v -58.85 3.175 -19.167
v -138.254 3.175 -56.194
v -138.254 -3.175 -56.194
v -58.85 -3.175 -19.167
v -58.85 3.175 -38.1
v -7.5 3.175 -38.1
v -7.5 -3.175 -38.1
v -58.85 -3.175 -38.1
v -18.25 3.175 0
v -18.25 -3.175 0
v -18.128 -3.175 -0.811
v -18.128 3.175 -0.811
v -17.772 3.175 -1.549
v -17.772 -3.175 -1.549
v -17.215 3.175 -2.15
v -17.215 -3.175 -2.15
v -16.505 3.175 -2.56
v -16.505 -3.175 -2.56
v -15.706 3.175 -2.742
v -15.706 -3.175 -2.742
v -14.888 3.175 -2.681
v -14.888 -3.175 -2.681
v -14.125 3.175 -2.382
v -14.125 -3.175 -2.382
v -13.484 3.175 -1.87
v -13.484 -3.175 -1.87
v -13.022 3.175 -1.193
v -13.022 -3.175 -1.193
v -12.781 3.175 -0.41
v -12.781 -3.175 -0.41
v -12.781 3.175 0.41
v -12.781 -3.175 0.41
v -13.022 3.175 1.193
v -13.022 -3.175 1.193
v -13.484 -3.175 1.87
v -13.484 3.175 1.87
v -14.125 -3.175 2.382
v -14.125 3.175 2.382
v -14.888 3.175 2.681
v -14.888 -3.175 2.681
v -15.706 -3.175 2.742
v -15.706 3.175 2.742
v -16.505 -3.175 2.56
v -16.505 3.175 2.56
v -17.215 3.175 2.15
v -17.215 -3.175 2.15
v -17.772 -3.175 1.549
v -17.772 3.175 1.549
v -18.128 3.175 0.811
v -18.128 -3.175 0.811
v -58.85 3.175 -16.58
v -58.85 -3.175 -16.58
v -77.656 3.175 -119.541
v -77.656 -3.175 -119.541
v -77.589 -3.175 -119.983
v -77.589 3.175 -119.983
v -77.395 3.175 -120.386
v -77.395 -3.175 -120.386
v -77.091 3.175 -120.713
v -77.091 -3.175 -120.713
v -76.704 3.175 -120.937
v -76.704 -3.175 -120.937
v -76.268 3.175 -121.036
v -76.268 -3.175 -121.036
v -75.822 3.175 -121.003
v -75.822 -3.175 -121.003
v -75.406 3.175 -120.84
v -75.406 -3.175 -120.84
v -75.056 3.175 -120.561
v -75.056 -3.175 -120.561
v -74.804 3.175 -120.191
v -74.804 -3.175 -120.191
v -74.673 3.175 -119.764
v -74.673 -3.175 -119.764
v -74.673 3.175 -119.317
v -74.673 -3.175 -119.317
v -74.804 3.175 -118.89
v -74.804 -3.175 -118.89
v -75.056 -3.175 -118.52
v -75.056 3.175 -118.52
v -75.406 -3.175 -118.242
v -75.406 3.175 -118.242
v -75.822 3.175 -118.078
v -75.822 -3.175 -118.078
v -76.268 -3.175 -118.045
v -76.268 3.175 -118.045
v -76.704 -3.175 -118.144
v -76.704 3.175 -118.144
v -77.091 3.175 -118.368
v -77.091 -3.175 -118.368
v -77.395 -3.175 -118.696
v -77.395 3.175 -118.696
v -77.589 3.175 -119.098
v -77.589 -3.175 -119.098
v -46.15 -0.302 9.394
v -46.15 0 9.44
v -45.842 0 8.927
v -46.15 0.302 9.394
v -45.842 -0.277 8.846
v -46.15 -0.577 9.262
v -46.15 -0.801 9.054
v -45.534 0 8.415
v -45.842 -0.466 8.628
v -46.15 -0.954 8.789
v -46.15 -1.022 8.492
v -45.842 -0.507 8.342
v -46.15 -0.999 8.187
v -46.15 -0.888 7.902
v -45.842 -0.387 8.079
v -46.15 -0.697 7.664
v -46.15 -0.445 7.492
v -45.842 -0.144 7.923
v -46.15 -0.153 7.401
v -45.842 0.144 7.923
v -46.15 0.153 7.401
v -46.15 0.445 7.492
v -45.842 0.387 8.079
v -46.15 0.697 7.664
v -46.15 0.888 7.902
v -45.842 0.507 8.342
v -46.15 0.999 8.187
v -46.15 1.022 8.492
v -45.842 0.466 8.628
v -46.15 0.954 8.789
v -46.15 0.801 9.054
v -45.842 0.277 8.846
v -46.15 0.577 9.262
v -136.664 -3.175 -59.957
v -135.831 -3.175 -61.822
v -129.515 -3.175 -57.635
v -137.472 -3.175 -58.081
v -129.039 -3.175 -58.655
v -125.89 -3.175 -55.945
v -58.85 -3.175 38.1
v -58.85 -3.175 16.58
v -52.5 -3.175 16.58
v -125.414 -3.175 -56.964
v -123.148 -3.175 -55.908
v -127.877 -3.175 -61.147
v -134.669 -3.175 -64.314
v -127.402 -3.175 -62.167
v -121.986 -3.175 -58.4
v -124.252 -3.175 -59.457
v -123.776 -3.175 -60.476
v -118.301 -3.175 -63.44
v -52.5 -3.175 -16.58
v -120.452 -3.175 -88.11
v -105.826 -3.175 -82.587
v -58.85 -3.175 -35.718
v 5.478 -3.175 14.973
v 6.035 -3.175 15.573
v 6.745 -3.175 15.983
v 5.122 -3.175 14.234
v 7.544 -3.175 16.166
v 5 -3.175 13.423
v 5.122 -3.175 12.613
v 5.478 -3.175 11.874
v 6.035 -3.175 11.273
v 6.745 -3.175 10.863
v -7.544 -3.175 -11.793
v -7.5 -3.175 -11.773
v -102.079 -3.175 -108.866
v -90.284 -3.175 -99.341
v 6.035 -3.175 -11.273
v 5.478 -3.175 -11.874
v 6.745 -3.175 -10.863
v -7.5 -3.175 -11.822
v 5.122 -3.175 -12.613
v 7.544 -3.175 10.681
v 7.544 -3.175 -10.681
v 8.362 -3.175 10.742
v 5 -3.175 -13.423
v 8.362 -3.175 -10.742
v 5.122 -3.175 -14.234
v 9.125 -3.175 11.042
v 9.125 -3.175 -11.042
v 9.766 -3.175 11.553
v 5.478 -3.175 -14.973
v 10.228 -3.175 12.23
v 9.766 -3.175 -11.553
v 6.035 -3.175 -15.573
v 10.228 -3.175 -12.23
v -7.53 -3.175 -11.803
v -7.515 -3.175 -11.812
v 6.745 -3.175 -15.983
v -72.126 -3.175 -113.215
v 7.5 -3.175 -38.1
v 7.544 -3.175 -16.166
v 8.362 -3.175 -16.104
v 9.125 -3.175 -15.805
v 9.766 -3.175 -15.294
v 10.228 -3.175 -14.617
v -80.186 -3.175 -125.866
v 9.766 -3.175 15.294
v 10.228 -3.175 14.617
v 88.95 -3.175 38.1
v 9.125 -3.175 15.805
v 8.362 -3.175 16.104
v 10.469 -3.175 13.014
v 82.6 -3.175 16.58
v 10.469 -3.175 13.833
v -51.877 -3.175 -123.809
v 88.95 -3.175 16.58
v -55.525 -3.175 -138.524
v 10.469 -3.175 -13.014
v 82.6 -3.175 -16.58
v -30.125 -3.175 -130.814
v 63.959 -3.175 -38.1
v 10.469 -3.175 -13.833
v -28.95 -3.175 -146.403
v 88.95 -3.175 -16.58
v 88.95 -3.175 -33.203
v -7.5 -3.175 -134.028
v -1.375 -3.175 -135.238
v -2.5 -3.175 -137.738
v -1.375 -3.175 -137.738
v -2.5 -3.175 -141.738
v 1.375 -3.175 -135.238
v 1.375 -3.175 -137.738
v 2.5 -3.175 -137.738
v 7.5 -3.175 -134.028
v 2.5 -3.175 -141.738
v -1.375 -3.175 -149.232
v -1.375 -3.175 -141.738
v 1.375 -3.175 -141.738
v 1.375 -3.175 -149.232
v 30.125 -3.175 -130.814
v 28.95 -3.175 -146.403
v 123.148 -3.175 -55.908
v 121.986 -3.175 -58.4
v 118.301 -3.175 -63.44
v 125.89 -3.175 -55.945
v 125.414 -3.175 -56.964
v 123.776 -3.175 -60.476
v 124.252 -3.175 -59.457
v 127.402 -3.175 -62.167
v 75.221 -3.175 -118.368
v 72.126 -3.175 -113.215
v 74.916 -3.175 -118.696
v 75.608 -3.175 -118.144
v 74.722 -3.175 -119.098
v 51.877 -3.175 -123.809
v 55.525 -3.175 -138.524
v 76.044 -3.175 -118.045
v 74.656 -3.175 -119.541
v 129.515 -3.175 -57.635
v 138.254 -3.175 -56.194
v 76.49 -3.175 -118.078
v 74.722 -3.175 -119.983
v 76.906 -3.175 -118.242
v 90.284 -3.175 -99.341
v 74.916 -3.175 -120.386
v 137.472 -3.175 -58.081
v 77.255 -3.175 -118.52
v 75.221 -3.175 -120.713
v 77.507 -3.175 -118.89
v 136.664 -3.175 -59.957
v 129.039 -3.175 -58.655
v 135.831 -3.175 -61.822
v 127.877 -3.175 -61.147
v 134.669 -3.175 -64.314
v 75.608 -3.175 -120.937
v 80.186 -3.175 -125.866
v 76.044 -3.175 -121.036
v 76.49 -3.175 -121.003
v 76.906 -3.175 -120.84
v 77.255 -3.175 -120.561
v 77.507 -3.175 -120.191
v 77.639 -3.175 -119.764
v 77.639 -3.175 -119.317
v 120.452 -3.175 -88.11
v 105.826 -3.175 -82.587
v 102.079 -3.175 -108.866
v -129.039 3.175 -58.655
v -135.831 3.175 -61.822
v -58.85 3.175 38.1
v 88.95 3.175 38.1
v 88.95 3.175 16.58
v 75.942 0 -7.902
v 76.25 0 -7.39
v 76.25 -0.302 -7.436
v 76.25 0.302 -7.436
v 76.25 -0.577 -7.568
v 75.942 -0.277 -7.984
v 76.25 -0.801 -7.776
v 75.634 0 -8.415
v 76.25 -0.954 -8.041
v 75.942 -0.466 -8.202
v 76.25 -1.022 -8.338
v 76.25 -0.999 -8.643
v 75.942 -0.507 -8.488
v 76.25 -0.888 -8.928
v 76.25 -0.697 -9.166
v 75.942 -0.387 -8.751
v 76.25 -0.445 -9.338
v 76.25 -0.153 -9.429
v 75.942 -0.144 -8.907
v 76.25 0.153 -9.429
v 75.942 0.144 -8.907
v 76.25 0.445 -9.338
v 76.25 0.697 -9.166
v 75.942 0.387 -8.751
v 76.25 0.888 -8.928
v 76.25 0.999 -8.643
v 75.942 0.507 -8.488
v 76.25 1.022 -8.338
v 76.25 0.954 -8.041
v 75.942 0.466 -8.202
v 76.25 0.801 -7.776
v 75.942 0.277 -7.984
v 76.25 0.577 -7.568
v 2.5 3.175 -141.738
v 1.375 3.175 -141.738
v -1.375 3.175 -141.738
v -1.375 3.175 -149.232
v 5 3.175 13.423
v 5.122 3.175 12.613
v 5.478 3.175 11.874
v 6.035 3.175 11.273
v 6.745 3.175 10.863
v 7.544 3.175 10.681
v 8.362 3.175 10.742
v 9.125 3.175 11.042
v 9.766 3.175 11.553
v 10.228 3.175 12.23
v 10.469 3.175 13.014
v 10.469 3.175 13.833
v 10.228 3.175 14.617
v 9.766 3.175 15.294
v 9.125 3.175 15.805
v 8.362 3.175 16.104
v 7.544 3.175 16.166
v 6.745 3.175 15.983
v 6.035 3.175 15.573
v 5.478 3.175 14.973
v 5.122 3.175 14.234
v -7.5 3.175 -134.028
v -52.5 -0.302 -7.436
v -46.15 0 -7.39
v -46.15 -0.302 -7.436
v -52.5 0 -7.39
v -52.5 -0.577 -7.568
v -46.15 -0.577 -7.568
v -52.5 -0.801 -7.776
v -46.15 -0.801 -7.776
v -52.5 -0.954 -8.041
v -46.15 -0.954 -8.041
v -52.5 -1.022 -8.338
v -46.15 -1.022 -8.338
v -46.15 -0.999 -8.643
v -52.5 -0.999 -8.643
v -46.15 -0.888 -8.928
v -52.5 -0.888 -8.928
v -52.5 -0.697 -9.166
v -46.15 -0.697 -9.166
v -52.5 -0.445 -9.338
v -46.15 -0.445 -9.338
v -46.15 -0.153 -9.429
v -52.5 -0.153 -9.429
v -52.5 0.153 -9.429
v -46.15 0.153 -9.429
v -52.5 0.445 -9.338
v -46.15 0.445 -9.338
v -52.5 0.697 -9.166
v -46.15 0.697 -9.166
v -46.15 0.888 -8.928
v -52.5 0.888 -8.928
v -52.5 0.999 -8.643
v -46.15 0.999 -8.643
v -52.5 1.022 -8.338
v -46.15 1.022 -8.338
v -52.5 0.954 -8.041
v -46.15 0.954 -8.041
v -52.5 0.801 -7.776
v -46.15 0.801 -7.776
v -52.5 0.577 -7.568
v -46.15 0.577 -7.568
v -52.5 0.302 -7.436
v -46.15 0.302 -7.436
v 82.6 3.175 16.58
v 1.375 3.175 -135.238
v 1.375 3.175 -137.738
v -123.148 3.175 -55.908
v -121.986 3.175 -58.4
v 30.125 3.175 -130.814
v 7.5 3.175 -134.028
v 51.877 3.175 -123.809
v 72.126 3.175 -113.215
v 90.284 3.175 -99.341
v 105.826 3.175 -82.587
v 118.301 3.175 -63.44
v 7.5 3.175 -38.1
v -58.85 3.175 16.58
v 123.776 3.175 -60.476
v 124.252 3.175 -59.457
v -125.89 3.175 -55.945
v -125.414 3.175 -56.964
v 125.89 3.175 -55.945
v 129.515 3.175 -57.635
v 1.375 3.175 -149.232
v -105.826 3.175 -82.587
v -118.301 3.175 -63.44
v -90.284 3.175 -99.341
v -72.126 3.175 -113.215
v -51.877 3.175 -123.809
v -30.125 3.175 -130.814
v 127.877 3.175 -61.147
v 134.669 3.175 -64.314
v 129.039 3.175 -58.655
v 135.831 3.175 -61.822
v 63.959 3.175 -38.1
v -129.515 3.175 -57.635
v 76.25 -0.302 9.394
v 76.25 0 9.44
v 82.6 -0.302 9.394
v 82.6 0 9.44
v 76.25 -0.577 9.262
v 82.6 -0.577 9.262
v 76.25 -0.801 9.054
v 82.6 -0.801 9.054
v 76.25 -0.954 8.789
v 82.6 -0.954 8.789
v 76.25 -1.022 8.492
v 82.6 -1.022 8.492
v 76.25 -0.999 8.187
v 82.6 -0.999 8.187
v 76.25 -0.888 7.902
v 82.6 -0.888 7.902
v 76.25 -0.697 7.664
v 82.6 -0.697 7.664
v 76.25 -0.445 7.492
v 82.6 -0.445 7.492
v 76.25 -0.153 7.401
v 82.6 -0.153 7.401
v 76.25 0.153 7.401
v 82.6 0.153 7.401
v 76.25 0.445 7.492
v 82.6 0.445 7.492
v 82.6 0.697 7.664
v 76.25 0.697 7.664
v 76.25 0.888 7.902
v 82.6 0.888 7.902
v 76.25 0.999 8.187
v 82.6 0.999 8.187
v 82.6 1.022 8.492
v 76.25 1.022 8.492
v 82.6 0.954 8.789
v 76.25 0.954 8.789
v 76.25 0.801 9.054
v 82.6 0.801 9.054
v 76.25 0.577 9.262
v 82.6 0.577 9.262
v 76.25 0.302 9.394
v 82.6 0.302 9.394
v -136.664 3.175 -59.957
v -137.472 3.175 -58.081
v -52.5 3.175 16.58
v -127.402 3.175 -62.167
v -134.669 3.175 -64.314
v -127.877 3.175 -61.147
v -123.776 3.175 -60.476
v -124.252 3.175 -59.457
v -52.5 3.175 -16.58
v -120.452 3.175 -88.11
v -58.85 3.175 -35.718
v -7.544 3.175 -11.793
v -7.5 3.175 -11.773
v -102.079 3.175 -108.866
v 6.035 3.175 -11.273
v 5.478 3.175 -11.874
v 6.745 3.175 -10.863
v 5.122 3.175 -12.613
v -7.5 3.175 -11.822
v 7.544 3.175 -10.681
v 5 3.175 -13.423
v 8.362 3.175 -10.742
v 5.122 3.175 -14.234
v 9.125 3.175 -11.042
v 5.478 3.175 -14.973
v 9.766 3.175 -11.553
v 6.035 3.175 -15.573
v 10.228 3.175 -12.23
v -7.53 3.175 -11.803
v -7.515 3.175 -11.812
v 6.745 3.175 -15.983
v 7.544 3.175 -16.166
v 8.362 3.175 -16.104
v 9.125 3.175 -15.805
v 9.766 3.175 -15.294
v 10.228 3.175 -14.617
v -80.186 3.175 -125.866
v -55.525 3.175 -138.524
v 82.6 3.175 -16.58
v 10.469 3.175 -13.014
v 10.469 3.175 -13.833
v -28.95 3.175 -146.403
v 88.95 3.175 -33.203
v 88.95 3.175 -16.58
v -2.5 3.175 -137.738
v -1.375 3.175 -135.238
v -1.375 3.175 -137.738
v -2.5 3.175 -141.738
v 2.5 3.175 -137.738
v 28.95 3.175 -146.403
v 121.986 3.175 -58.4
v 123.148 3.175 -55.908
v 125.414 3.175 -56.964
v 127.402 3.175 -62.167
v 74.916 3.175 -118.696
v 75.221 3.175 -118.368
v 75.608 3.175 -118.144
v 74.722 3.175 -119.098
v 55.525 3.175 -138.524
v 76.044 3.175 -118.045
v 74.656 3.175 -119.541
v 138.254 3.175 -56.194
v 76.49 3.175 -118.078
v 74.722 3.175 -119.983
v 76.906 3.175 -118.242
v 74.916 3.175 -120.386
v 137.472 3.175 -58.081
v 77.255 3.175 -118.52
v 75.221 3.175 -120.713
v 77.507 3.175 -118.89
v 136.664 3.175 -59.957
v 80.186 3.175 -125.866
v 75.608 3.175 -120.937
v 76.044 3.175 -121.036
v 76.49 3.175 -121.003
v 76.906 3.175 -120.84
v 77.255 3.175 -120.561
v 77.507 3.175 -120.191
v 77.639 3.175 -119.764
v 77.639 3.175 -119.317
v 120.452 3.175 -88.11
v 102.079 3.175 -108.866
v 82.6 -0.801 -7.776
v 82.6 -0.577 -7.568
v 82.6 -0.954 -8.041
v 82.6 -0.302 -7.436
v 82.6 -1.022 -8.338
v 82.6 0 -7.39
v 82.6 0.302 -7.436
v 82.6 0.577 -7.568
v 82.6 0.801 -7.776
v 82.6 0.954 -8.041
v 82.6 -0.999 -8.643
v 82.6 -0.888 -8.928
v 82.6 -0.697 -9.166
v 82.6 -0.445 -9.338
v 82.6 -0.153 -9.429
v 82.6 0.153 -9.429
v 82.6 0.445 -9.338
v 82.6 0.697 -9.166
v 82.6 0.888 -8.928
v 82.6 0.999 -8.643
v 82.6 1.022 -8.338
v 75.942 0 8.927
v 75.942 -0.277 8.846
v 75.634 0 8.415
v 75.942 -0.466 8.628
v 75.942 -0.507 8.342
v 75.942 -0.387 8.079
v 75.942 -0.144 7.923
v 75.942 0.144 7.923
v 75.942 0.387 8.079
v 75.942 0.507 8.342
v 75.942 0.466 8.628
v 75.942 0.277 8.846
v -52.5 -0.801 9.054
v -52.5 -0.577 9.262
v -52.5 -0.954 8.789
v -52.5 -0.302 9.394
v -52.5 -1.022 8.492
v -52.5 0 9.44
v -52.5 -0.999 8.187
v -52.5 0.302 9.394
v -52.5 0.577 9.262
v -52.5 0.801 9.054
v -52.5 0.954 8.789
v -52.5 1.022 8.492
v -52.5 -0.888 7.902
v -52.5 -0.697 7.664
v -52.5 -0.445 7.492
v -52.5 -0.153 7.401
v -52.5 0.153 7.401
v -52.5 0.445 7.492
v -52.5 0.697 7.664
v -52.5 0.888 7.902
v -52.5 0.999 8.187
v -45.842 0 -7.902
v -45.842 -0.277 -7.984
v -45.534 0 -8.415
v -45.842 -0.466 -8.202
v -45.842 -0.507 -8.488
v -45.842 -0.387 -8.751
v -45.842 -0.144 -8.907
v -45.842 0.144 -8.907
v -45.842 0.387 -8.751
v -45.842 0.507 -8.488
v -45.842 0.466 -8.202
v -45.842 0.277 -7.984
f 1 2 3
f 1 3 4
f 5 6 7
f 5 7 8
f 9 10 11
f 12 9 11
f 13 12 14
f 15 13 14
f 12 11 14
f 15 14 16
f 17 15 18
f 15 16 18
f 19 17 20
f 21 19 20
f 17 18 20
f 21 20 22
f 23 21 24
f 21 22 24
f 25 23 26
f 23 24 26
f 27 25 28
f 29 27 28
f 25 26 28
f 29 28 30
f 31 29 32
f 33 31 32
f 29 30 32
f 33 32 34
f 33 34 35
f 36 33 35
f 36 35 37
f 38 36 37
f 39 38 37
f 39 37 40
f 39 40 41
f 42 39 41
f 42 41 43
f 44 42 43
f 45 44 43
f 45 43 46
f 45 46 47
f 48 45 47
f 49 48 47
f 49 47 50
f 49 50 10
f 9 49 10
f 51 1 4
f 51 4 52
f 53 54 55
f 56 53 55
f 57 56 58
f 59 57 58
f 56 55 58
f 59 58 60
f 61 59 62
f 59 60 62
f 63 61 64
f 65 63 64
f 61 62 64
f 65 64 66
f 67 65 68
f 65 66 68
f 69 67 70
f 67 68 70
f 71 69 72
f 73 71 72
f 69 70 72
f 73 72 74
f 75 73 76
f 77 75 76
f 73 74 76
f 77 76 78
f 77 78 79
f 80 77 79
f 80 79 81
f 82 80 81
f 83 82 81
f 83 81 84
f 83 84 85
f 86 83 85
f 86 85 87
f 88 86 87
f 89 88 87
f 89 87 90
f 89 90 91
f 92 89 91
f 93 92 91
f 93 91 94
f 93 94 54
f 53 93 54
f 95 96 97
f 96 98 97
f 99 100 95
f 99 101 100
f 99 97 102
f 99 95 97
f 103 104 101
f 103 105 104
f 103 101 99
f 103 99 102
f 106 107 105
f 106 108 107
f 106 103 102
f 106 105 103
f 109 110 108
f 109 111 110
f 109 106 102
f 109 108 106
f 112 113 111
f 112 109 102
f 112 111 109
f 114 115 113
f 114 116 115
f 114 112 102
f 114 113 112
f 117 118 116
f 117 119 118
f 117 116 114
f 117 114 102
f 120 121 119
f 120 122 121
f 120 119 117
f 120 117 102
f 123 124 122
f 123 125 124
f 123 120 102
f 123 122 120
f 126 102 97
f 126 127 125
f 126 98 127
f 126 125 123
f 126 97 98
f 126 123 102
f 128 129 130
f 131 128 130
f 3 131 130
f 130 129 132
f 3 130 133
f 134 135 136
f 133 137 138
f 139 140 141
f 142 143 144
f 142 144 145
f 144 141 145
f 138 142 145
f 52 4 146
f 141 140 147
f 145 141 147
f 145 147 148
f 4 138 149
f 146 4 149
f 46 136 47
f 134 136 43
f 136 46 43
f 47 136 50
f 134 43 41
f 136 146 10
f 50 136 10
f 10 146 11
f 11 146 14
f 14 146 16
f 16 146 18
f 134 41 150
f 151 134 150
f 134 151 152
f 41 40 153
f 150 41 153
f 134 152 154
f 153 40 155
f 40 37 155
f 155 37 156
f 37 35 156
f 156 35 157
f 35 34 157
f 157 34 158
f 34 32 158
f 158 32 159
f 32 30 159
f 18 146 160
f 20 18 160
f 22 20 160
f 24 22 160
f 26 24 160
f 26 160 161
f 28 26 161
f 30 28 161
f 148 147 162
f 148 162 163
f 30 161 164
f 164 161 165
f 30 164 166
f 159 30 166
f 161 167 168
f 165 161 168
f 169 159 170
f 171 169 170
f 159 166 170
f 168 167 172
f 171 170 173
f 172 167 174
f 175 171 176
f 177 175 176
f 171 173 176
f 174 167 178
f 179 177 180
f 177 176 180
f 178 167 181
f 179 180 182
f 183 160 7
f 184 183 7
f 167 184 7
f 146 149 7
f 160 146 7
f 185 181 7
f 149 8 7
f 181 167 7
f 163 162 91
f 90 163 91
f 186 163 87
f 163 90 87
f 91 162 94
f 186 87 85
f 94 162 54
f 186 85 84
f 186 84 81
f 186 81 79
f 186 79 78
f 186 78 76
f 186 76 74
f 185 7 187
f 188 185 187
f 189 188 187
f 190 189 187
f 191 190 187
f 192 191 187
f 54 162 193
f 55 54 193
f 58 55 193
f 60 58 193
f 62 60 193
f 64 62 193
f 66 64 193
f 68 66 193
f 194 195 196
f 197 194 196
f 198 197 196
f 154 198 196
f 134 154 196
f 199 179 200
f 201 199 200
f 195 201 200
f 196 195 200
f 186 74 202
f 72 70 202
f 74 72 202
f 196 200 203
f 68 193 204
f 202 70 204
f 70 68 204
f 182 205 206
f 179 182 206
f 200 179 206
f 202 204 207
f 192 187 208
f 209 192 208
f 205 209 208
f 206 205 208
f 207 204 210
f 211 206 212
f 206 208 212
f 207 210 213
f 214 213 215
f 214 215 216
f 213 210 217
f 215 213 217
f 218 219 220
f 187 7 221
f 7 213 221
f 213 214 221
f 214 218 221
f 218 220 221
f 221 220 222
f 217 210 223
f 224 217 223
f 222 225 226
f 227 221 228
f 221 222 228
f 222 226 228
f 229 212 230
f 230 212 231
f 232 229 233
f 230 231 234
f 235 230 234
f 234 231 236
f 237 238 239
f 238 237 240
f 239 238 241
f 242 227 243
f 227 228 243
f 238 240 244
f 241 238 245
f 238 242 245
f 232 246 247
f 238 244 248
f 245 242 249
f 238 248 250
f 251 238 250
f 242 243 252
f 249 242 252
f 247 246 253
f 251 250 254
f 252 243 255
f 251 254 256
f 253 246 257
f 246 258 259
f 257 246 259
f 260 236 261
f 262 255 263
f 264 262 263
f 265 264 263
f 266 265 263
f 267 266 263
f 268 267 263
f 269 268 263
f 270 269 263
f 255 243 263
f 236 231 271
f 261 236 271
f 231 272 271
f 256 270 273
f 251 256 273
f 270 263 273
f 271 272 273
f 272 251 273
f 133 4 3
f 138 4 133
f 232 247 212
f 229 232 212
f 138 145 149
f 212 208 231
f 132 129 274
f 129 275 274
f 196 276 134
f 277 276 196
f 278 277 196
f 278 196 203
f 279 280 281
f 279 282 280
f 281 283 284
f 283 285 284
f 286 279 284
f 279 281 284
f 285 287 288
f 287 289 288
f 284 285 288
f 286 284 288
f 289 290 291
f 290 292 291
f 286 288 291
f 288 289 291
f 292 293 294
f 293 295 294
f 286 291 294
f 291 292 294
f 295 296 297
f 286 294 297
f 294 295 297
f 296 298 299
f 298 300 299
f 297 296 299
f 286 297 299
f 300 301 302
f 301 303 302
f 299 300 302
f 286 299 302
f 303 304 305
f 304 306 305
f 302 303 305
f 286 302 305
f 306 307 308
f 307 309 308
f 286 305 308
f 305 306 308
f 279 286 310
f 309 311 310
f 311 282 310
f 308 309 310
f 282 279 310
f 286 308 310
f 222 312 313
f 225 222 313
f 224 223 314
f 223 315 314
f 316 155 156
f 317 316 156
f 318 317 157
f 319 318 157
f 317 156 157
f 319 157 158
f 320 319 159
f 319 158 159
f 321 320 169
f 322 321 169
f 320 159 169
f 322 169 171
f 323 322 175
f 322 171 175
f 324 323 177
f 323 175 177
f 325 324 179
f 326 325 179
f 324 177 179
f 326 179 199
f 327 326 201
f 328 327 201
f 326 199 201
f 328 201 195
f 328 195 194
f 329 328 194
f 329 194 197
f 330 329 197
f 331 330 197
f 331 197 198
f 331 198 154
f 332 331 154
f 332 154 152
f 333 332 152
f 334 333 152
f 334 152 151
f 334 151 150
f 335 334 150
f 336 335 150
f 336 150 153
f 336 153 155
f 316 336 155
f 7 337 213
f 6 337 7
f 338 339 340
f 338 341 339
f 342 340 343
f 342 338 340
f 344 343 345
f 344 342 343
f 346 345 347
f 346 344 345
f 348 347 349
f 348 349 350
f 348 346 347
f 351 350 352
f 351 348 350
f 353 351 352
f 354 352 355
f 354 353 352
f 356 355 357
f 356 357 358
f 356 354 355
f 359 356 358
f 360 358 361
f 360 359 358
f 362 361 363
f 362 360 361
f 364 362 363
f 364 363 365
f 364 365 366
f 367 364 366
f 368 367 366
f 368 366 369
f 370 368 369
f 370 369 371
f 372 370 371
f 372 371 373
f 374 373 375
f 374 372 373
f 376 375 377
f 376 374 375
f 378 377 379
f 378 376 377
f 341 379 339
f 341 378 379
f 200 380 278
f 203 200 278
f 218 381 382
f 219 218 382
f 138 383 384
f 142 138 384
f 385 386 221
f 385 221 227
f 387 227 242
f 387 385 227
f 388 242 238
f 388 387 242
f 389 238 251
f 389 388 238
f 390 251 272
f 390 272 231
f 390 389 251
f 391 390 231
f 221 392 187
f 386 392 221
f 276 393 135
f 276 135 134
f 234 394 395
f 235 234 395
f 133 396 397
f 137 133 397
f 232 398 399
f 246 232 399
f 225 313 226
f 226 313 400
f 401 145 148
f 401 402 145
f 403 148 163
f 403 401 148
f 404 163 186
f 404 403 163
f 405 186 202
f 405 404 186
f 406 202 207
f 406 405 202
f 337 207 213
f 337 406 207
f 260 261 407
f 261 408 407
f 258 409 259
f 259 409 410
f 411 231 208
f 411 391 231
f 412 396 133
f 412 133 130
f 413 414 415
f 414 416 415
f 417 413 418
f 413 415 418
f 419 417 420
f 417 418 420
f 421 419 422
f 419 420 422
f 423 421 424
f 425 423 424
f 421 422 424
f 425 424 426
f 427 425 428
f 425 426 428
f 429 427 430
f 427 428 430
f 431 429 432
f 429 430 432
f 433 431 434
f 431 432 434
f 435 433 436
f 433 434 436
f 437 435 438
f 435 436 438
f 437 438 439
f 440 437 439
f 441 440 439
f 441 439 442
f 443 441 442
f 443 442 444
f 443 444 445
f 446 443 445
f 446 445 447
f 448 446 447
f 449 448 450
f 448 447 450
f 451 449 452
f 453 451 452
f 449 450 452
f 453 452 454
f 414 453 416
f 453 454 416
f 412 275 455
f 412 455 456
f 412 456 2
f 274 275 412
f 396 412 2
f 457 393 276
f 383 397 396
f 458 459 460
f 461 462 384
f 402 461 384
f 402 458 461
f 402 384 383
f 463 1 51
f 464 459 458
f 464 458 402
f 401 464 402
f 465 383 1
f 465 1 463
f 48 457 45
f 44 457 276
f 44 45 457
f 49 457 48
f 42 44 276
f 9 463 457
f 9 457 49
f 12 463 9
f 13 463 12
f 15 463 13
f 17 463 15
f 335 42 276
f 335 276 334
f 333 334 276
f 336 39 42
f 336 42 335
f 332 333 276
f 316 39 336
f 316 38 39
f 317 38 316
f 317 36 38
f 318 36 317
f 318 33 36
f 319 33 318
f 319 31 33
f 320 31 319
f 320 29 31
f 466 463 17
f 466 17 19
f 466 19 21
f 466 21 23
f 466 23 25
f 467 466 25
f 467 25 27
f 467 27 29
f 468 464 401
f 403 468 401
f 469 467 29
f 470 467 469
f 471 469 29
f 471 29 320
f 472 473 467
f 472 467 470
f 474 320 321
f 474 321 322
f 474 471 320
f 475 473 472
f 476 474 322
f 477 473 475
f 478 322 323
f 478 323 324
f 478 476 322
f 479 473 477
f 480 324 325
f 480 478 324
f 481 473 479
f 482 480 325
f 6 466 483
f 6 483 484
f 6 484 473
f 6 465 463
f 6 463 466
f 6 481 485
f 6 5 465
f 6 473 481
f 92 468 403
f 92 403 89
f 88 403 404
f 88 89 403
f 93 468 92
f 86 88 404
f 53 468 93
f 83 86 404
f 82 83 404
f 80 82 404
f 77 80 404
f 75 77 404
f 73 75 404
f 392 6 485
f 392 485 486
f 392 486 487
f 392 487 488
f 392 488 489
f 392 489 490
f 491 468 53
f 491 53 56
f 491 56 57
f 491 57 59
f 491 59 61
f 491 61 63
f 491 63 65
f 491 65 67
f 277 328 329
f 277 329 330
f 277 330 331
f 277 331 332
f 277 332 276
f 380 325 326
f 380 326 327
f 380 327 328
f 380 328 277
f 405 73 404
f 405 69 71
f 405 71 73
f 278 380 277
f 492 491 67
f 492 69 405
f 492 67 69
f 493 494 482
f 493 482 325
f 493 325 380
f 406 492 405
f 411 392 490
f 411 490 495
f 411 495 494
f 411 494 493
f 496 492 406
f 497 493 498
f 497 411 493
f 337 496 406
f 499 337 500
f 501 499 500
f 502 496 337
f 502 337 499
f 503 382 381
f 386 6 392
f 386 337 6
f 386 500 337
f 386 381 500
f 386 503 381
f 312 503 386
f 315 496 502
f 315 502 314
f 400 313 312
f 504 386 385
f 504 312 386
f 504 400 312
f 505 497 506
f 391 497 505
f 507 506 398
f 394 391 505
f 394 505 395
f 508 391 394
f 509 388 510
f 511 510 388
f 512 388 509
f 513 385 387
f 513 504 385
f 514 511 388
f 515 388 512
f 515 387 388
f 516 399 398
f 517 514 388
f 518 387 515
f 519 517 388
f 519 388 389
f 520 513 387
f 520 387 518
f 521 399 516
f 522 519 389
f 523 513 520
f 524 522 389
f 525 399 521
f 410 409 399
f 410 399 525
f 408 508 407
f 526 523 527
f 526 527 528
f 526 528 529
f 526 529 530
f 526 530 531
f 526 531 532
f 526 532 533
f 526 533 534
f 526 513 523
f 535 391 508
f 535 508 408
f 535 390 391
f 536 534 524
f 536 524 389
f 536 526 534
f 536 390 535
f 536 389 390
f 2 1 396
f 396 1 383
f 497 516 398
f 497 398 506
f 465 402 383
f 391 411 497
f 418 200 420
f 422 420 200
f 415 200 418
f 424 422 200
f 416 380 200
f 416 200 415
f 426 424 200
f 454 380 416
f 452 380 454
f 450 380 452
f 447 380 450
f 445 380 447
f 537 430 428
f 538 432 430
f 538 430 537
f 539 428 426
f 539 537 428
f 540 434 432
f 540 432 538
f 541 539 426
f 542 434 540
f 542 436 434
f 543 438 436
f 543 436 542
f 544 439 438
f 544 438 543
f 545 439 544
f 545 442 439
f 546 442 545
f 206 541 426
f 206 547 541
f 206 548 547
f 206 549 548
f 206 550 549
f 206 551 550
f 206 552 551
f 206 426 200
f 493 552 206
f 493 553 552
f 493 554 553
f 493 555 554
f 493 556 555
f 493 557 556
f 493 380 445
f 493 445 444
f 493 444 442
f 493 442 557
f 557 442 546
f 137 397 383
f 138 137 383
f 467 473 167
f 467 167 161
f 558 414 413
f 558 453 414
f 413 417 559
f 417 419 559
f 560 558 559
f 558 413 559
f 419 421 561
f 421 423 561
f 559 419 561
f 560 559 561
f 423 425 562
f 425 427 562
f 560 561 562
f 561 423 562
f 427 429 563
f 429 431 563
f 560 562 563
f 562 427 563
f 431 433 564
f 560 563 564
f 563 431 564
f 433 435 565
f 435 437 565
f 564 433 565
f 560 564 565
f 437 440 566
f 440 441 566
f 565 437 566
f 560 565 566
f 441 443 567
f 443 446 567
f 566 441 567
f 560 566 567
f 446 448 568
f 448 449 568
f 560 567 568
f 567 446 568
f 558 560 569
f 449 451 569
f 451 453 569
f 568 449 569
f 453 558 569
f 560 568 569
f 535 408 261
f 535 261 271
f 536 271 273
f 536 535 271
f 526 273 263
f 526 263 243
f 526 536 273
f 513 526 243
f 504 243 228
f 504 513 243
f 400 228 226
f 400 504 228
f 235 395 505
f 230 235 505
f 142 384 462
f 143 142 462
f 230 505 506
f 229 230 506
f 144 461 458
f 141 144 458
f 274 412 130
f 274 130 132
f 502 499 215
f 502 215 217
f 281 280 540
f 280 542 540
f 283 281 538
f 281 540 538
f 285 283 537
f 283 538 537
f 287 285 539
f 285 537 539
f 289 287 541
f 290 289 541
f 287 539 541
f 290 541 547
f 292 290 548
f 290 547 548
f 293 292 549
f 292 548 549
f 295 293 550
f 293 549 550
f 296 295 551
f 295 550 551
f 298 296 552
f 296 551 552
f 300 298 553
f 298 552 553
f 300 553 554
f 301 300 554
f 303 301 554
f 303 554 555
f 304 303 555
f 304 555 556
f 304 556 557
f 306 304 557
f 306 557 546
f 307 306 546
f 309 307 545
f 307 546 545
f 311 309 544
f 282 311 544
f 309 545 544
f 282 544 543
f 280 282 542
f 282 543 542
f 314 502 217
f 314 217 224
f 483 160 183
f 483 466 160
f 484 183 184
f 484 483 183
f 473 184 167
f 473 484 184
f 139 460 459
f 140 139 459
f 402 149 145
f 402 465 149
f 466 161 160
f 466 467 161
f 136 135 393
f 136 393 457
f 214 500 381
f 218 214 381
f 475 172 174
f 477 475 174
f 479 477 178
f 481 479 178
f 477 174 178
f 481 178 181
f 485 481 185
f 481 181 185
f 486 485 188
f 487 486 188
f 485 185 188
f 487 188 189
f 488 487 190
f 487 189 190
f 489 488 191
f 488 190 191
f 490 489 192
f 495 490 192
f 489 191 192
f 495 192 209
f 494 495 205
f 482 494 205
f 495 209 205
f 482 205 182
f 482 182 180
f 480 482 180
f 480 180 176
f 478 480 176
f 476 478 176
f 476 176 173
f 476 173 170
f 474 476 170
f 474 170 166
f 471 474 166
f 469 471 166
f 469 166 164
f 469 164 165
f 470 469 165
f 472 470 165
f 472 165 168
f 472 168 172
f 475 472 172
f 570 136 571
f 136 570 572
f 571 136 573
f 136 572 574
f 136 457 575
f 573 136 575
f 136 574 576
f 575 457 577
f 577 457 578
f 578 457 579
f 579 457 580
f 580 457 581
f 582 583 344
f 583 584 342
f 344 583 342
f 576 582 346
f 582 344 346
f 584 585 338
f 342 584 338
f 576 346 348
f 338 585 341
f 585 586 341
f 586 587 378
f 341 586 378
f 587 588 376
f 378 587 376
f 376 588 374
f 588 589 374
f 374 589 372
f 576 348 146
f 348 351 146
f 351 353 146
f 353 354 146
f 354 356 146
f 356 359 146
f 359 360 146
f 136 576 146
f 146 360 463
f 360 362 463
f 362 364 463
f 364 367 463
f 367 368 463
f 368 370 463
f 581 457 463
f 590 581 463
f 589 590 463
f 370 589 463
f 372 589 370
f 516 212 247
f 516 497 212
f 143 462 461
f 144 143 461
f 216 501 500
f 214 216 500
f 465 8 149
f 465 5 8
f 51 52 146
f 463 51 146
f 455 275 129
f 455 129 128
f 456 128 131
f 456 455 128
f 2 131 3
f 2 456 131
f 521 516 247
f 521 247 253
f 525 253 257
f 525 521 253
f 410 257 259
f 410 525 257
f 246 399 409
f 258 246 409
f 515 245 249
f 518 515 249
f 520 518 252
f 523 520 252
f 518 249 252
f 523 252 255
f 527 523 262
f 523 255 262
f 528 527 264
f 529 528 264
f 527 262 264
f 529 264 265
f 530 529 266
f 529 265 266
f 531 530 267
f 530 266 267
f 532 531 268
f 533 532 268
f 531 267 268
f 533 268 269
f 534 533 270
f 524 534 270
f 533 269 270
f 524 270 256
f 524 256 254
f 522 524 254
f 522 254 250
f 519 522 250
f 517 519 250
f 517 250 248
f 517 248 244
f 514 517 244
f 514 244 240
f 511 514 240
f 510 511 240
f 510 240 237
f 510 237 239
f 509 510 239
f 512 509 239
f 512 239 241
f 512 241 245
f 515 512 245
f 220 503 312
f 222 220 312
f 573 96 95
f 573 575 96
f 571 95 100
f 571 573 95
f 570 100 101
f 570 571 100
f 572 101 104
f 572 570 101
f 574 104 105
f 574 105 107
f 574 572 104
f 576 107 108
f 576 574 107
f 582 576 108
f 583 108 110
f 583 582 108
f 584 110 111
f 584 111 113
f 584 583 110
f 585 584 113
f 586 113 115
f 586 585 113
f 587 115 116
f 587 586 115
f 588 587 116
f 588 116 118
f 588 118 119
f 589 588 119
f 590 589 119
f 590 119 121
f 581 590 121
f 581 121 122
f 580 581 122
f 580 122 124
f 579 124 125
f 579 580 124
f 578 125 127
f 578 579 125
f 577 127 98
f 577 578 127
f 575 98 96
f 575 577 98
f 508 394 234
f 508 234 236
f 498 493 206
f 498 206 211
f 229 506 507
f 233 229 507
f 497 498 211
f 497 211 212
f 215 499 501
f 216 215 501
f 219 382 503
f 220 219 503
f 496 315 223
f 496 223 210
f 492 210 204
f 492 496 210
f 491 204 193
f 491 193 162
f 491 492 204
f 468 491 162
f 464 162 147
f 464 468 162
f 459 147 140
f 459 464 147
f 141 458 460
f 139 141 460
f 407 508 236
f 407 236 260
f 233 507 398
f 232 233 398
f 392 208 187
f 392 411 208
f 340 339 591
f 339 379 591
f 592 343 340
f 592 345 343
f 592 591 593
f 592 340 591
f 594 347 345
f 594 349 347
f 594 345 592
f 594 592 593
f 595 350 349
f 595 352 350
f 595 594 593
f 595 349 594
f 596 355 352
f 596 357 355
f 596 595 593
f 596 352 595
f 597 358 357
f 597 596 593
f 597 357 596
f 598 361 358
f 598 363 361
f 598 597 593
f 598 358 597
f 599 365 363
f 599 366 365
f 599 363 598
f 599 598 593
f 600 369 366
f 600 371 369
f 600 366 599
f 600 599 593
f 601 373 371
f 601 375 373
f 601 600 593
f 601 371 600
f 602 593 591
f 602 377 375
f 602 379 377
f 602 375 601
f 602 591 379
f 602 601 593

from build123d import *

# Parameters (mm, degrees)
BOSS_EXTRUDE1_DEPTH               = 3.175
SKETCH2_W                         = 2.75
SKETCH2_H                         = 2.5
SKETCH2_H_2                       = 4
SKETCH2_W_2                       = 1.125
SKETCH2_H_3                       = 7.5
CUT_EXTRUDE1_DEPTH                = 204.460831631
CIRPATTERN1_COUNT                 = 2
CIRPATTERN1_ANGLE                 = 65
CIRPATTERN1_THE_OTHER_WAY_COUNT   = 2
CIRPATTERN1_THE_OTHER_WAY_ANGLE   = 65
F_3_0_3_DIAMETER_HOLE1_D          = 3
M5_CLEARANCE_HOLE1_D              = 5.5
SKETCH9_W                         = 6.35
SKETCH9_H                         = 33.16
CUT_EXTRUDE2_DEPTH                = 204.530492207
M2_5X0_45_TAPPED_HOLE1_AT_2_COUNT = 2
M2_5X0_45_TAPPED_HOLE1_AT_2_PITCH = 16.83


with BuildPart() as part:
    # Sketch1 → Boss-Extrude1 (new, symmetric)
    with BuildSketch(Plane(origin=(0, 0, 0), x_dir=(1, 0, 0), z_dir=(0, 1, 0))):
        with BuildLine():
            Line((88.95, 33.202731801), (138.254290129, 56.193699868))
            ThreePointArc((138.254290129, 56.193699868), (0, 149.238), (-138.254290129, 56.193699868))
            Line((-138.254290129, 56.193699868), (-58.85, 19.16687129))
            Line((-58.85, 19.16687129), (-58.85, -38.1))
            Line((-58.85, -38.1), (88.95, -38.1))
            Line((88.95, -38.1), (88.95, 33.202731801))
        make_face()
        with BuildLine():
            Line((-7.5, 11.821590418), (-7.5, 11.772641828))
            Line((-7.5, 11.772641828), (-7.544362488, 11.793328396))
            ThreePointArc((-7.544362488, 11.793328396), (-7.522194517, 11.807480241), (-7.5, 11.821590418))
        make_face(mode=Mode.SUBTRACT)
        with BuildLine():
            ThreePointArc((7.5, 11.821590418), (7.522194517, 11.807480241), (7.544362488, 11.793328396))
            Line((7.544362488, 11.793328396), (7.5, 11.772641828))
            Line((7.5, 11.772641828), (7.5, 11.821590418))
        make_face(mode=Mode.SUBTRACT)
        with BuildLine():
            Line((-7.5, 134.028320306), (-7.5, 38.1))
            Line((-7.5, 38.1), (-58.85, 38.1))
            Line((-58.85, 38.1), (-58.85, 35.717540075))
            Line((-58.85, 35.717540075), (-118.301273414, 63.440124154))
            ThreePointArc((-118.301273414, 63.440124154), (-72.126024825, 113.215180903), (-7.5, 134.028320306))
        make_face(mode=Mode.SUBTRACT)
        with BuildLine():
            ThreePointArc((7.5, 134.028320306), (72.126024825, 113.215180903), (118.301273414, 63.440124154))
            Line((118.301273414, 63.440124154), (63.959201798, 38.1))
            Line((63.959201798, 38.1), (7.5, 38.1))
            Line((7.5, 38.1), (7.5, 134.028320306))
        make_face(mode=Mode.SUBTRACT)
    extrude(amount=BOSS_EXTRUDE1_DEPTH, both=True)

    # Sketch2 → Cut-Extrude1 (cut, symmetric)
    with BuildSketch(Plane(origin=(0, 0, 0), x_dir=(1, 0, 0), z_dir=(0, 1, 0))):
        with Locations((0, 136.488)):
            Rectangle(SKETCH2_W, SKETCH2_H)
        with Locations((0, 139.738)):
            Rectangle(SKETCH2_W, SKETCH2_H_2)
        with Locations((1.9375, 139.738)):
            Rectangle(SKETCH2_W_2, SKETCH2_H_2)
        with Locations((0, 145.488)):
            Rectangle(SKETCH2_W, SKETCH2_H_3)
        with Locations((-1.9375, 139.738)):
            Rectangle(SKETCH2_W_2, SKETCH2_H_2)
    cut_extrude1 = extrude(amount=CUT_EXTRUDE1_DEPTH, both=True, mode=Mode.SUBTRACT)

    # CirPattern1: Cut-Extrude1 ×2 about axis
    cirpattern1_axis = Axis((0, 0, 0), (0, 1, 0))
    for i in range(1, CIRPATTERN1_COUNT):
        add(cut_extrude1.rotate(cirpattern1_axis, i * CIRPATTERN1_ANGLE / (CIRPATTERN1_COUNT - 1)), mode=Mode.SUBTRACT)

    # CirPattern1 the other way: Cut-Extrude1 ×2 about axis
    cirpattern1_the_other_way_axis = Axis((0, 0, 0), (0, -1, 0))
    for i in range(1, CIRPATTERN1_THE_OTHER_WAY_COUNT):
        add(cut_extrude1.rotate(cirpattern1_the_other_way_axis, i * CIRPATTERN1_THE_OTHER_WAY_ANGLE / (CIRPATTERN1_THE_OTHER_WAY_COUNT - 1)), mode=Mode.SUBTRACT)

    # Ø3.0 (3) Diameter Hole1 (through all)
    with Locations(Plane(origin=(0, 3.175, 0), x_dir=(1, 0, 0), z_dir=(0, 1, 0))):
        with Locations((76.155771888, 119.540616747), (-76.155771888, 119.540616747)):
            Hole(F_3_0_3_DIAMETER_HOLE1_D / 2)

    # M5 Clearance Hole1 (through all)
    with Locations(Plane(origin=(0, 3.175, 0), x_dir=(1, 0, 0), z_dir=(0, 1, 0))):
        with Locations((-15.5, 0), (7.75, 13.423393759), (7.75, -13.423393759)):
            Hole(M5_CLEARANCE_HOLE1_D / 2)

    # Sketch9 → Cut-Extrude2 (cut, through all)
    with BuildSketch(Plane(origin=(0, 3.175, 0), x_dir=(1, 0, 0), z_dir=(0, 1, 0))):
        with Locations((-55.675, 0)):
            Rectangle(SKETCH9_W, SKETCH9_H)
        with Locations((85.775, 0)):
            Rectangle(SKETCH9_W, SKETCH9_H)
    extrude(amount=-CUT_EXTRUDE2_DEPTH, mode=Mode.SUBTRACT)

    # Sketch11 → M2.5x0.45 Tapped Hole1 (revolve, cut)
    with BuildSketch(Plane(origin=(-52.5, 0, -8.415), x_dir=(0, 0, 1), z_dir=(0, 1, 0))):
        Polygon((0, 0), (0, 6.965882135), (1.025, 6.35), (1.025, 0), align=None)
    m2_5x0_45_tapped_hole1 = revolve(axis=Axis((-58.85, 0, -8.415), (1, 0, 0)), mode=Mode.SUBTRACT)

    # M2.5x0.45 Tapped Hole1 at 2: M2.5x0.45 Tapped Hole1 ×2
    with Locations(*[(0, 0, i * M2_5X0_45_TAPPED_HOLE1_AT_2_PITCH) for i in range(1, M2_5X0_45_TAPPED_HOLE1_AT_2_COUNT)]):
        add(m2_5x0_45_tapped_hole1, mode=Mode.SUBTRACT)

    # Mirror1: M2.5x0.45 Tapped Hole1 across plane
    add(m2_5x0_45_tapped_hole1.mirror(Plane.ZY.offset(-15.05)), mode=Mode.SUBTRACT)

    # Mirror1 copy 1 sketch → Mirror1 copy 1 (revolve, cut)
    with BuildSketch(Plane(origin=(82.6, 0, 8.415), x_dir=(0, 0, 1), z_dir=(0, 1, 0))):
        Polygon((0, 0), (0, -6.965882135), (1.025, -6.35), (1.025, 0), align=None)
    revolve(axis=Axis((88.95, 0, 8.415), (1, 0, 0)), mode=Mode.SUBTRACT)


solid = part.part
